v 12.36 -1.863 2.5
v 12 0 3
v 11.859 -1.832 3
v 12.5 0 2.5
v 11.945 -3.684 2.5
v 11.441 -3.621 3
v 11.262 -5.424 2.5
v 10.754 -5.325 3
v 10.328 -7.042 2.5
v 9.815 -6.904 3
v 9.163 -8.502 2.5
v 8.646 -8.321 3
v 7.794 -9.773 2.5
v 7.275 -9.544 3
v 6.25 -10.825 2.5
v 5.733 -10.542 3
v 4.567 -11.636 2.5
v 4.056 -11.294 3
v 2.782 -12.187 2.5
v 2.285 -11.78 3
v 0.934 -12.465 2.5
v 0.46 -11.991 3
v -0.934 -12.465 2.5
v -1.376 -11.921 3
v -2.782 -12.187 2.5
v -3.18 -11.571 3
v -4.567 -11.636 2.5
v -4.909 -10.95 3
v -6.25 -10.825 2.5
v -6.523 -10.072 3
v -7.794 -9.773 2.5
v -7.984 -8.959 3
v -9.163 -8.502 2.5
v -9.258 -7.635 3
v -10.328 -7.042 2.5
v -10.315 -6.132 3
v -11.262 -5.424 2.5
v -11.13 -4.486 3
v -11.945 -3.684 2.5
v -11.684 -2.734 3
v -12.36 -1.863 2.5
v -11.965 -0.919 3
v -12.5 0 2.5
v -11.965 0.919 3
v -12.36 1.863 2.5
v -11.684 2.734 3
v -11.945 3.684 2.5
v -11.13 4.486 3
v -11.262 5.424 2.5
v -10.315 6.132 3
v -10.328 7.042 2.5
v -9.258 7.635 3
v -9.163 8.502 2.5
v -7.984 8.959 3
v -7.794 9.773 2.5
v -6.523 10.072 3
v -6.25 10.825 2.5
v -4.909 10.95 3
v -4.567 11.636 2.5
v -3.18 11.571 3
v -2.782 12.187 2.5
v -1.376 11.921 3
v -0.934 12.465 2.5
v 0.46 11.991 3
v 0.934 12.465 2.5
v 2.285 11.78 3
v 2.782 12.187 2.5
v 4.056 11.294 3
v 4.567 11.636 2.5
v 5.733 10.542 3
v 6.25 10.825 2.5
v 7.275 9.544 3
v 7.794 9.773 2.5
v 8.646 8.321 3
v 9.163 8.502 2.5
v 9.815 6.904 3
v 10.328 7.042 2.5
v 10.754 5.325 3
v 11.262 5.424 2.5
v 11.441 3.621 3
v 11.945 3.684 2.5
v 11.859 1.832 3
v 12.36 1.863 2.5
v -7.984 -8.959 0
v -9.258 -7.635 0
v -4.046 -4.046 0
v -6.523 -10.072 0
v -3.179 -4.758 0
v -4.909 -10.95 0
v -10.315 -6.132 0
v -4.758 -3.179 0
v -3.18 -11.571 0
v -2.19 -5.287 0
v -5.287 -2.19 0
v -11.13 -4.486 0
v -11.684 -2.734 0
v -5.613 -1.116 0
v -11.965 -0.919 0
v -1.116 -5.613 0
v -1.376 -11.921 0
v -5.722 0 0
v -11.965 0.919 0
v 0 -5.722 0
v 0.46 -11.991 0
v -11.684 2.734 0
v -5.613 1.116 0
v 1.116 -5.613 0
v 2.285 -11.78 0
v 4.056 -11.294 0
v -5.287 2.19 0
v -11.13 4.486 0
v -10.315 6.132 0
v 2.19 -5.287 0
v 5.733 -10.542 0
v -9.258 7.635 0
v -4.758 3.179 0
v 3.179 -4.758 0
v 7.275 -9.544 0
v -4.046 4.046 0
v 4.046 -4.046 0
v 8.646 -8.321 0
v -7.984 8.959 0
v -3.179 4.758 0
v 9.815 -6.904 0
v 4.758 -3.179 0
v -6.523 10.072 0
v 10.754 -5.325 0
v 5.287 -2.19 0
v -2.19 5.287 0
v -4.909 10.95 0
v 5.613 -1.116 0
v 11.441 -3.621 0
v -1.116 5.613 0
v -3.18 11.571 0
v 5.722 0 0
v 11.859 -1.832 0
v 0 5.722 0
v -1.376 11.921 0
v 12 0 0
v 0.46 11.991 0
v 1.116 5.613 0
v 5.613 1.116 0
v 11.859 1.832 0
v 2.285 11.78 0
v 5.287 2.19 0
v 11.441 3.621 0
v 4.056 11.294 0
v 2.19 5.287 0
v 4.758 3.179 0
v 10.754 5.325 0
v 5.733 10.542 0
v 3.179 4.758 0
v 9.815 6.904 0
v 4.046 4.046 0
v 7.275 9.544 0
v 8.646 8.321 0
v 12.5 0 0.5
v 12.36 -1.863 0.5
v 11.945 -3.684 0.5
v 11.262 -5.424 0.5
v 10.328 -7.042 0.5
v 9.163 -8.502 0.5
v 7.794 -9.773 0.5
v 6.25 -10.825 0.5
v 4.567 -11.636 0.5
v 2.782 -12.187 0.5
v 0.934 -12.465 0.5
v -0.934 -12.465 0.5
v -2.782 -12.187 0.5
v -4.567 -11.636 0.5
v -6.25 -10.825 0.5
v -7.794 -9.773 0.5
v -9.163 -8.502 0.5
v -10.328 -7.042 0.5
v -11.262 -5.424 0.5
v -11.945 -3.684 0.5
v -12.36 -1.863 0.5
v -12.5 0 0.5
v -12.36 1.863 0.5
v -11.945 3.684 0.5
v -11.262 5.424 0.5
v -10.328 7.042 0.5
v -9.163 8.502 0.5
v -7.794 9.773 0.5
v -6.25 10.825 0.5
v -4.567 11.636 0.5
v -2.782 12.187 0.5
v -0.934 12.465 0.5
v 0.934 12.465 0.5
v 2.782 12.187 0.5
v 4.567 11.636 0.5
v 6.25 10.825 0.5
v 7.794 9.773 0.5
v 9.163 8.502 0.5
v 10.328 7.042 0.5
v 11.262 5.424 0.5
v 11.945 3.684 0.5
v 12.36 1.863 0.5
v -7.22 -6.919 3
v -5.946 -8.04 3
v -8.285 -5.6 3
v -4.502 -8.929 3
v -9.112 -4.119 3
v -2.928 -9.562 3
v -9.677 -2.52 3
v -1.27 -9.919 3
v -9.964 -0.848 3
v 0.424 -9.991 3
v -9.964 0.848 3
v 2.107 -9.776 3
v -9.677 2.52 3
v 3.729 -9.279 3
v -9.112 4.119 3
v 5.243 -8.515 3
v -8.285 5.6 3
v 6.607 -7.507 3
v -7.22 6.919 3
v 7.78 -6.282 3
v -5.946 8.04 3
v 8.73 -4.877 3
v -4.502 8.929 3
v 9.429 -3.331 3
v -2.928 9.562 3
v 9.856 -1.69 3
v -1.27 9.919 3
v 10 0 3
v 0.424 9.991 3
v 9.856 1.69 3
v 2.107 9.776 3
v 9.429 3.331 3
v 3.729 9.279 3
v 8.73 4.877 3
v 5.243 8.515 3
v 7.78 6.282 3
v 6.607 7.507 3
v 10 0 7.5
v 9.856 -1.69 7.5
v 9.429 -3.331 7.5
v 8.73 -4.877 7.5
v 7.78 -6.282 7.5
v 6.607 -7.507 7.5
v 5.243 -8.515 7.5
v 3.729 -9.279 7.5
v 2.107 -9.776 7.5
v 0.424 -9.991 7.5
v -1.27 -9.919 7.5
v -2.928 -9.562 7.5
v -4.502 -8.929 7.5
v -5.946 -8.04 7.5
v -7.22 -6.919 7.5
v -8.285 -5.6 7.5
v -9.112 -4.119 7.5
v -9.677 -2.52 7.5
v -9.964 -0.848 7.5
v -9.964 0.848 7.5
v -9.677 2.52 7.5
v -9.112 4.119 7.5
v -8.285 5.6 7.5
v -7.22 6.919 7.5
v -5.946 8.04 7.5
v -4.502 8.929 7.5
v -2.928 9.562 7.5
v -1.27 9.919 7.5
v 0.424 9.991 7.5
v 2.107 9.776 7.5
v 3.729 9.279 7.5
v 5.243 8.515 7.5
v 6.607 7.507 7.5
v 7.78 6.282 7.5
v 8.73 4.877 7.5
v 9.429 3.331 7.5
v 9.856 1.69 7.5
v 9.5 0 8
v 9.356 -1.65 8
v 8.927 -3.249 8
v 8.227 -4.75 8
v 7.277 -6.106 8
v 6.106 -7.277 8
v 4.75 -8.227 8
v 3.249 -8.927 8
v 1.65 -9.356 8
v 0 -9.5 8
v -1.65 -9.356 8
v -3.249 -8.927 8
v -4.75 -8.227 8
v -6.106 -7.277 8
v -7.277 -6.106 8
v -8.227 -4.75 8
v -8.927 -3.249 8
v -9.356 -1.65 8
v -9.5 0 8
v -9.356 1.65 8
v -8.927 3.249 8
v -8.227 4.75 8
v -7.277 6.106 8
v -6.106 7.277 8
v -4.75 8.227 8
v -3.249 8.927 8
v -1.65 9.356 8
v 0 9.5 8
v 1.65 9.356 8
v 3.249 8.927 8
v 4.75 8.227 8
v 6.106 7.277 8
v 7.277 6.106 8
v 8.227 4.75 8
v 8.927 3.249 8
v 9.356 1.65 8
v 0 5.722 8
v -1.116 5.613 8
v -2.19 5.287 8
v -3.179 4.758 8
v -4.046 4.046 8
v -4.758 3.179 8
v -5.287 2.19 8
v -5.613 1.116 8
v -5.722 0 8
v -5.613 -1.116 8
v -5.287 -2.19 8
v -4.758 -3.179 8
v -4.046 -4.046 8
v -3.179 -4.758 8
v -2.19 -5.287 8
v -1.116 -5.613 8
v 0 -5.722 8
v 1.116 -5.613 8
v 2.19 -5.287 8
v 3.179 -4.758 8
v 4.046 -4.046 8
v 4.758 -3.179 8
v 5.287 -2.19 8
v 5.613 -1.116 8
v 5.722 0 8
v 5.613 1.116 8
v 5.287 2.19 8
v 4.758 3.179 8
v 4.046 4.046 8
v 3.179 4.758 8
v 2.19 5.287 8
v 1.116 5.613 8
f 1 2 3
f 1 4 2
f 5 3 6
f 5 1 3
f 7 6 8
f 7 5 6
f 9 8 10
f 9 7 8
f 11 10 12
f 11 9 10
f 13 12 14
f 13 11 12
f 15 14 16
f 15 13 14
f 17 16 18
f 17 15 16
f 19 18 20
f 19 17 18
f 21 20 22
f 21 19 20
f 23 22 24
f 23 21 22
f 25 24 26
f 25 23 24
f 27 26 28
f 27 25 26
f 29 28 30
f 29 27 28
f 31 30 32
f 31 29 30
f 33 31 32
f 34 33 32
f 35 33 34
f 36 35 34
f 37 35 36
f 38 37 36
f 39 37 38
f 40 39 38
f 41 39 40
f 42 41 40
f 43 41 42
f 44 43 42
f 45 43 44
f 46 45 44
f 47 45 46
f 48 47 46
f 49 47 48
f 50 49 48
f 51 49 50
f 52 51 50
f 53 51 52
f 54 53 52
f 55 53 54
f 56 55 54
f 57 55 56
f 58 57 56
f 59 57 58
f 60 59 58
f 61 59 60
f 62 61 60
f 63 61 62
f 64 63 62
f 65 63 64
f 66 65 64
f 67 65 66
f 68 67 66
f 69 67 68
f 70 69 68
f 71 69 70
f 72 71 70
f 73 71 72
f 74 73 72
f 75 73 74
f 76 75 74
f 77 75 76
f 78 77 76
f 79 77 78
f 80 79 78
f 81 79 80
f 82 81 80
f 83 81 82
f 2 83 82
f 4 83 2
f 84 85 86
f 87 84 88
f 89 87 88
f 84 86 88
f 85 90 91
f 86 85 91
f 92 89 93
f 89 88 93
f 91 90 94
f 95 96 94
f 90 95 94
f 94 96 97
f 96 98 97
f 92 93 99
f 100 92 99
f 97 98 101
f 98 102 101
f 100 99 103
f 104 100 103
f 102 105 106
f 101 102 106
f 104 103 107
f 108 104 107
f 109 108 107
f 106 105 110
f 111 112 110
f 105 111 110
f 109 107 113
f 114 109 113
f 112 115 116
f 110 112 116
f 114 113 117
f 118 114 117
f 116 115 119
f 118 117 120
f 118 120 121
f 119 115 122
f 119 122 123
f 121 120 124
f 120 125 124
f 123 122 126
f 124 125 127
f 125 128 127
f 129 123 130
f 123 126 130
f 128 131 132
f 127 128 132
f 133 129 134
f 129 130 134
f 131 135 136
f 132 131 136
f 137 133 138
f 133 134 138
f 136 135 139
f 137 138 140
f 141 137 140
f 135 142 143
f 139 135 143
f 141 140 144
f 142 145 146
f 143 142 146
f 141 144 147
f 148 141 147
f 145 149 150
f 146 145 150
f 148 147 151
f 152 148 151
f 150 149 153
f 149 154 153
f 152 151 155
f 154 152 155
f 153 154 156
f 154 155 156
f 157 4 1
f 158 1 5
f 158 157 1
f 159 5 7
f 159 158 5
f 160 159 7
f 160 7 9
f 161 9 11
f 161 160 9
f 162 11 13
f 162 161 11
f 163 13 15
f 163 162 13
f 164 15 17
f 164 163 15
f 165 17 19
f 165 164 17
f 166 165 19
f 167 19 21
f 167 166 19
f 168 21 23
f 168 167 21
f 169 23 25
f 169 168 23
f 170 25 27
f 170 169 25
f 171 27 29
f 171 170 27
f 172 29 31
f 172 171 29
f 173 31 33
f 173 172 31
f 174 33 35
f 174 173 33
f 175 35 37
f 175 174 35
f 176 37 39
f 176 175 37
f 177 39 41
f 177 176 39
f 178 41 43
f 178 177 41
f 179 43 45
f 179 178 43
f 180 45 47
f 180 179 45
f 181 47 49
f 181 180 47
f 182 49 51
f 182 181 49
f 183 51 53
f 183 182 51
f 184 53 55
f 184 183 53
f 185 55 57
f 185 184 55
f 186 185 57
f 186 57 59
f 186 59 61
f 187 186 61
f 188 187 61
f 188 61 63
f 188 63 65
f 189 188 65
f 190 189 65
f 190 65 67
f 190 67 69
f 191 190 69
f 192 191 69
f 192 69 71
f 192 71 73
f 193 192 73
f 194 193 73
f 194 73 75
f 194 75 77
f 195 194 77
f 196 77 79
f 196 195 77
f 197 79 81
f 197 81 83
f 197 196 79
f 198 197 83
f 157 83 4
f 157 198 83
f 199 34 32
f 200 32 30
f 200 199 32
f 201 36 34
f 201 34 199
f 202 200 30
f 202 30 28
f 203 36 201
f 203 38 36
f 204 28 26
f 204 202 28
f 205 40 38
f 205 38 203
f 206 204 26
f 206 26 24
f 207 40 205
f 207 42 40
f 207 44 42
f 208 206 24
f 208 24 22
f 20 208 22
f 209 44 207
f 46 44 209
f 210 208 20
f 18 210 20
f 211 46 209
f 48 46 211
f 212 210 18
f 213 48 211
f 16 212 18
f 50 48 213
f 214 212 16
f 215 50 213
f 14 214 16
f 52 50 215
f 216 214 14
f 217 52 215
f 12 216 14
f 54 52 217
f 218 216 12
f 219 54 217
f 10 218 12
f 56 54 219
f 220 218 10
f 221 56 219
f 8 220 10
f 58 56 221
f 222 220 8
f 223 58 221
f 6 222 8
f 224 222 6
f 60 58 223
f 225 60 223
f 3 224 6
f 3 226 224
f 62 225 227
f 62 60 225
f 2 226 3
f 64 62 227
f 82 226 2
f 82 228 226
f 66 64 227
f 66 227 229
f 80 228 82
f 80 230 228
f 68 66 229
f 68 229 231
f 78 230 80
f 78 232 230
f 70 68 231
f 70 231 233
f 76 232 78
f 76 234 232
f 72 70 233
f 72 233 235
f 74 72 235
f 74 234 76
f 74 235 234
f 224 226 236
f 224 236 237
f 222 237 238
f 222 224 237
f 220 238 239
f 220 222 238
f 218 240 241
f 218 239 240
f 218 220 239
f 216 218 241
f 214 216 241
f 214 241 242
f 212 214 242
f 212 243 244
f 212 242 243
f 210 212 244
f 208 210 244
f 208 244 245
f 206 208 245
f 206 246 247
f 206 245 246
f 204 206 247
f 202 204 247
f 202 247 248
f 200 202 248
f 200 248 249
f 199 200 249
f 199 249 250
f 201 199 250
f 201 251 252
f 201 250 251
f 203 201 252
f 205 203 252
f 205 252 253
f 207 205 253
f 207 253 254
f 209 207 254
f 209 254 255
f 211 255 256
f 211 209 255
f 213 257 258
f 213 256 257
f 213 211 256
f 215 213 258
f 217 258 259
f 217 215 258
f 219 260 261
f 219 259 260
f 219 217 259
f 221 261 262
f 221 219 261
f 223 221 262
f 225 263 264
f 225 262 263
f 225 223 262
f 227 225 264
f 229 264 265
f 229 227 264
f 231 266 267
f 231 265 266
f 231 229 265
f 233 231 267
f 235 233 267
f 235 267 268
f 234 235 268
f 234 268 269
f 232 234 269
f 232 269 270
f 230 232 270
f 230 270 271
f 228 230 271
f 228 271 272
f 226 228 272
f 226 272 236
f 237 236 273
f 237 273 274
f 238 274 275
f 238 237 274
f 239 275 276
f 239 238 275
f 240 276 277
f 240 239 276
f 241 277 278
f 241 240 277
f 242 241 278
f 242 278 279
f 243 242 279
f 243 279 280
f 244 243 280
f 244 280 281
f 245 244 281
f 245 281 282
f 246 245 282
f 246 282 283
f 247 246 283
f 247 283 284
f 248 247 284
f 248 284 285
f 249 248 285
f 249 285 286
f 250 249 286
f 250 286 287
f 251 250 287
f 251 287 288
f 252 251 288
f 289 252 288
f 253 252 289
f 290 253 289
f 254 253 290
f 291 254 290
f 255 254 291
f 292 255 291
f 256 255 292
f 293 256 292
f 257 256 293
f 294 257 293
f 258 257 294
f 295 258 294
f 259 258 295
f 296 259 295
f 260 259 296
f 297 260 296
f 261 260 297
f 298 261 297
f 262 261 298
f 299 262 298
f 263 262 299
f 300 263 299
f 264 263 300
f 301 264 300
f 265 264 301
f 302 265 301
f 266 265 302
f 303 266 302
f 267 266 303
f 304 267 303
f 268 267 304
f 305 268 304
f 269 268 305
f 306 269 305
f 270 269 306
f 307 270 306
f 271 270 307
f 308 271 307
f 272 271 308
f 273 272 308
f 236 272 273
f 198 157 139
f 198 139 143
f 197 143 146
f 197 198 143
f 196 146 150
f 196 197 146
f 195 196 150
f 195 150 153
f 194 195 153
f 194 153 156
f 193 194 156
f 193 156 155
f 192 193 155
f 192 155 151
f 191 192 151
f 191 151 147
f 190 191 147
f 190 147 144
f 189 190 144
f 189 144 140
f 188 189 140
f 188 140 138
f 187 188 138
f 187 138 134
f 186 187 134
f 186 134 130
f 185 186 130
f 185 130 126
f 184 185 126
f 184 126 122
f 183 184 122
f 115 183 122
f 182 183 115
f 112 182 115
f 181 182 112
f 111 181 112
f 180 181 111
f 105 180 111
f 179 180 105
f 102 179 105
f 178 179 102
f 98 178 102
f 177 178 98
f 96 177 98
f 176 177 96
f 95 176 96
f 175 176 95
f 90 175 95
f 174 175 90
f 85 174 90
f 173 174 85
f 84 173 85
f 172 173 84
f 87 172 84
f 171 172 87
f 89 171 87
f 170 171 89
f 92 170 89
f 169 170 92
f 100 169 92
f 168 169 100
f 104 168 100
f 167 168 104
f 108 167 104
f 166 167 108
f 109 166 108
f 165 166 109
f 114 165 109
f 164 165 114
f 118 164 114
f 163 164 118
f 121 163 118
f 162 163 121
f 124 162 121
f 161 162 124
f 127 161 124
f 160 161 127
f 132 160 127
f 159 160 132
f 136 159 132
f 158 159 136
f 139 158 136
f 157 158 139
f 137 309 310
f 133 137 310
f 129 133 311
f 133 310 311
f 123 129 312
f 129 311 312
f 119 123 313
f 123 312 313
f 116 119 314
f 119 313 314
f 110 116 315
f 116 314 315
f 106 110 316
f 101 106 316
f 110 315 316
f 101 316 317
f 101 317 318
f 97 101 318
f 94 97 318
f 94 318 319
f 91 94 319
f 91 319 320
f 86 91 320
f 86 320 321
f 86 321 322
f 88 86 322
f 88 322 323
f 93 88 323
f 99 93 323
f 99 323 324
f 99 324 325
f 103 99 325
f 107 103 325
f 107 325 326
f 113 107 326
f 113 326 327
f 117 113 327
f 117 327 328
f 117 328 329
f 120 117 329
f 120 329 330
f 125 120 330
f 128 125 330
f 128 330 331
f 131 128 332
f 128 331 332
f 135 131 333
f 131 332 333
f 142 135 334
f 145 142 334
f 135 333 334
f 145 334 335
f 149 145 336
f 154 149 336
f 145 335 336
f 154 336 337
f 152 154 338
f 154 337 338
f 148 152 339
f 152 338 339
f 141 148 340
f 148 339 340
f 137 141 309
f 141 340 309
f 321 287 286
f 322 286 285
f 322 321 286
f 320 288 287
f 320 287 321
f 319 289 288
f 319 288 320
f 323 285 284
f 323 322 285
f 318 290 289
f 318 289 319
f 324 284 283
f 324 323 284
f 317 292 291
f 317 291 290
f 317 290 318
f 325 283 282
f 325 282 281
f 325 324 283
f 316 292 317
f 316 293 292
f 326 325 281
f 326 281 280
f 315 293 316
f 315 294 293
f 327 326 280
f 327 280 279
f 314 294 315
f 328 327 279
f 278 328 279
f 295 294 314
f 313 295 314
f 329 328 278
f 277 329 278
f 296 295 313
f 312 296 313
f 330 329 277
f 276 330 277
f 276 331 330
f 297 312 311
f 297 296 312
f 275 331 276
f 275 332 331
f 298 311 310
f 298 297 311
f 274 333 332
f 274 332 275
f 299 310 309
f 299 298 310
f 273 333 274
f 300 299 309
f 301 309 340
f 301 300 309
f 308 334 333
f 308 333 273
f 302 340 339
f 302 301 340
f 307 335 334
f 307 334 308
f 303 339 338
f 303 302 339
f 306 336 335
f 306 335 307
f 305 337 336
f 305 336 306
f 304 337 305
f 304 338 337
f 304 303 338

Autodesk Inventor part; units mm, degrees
ref_plane "YZ Plane" through (0, 0, 0) normal (1, 0, 0) x (0, 1, 0)
ref_plane "XZ Plane" through (0, 0, 0) normal (0, 1, 0) x (-1, 0, 0)
ref_plane "XY Plane" through (0, 0, 0) normal (0, 0, 1) x (1, 0, 0)
sketch "Skizze1" plane through (0, 0, 0) normal (0, 0, 1) x (1, 0, 0)
  line L0 (-17.5, 0) -> (17.5, 0) projected
  line L1 (0, -17.5) -> (0, 17.5) projected
  circle A0 centre (0, 0) radius 12.5
  dimension "d0" = 25
extrude "Extrusion1" add sketch "Skizze1" along normal blind 3
sketch "Skizze2" plane through (0, 0, 3) normal (0, 0, 1) x (1, 0, 0)
  circle A0 centre (0, 0) radius 10
  dimension "d3" = 20
extrude "Extrusion2" add sketch "Skizze2" along normal blind 5
thread "Gewinde1" size "M20x2.5" class "6g" standard "ISO Metric profile" length 15
chamfer "Fase1" distance 0.5 angle 45 3 edges at (-10, 0, 8) (-12.5, 0, 3) (-12.5, 0, 0)
sketch "Skizze3" plane through (0, 0, 0) normal (0, 0, -1) x (-1, 0, 0)
  point P0 (0, 0)
  point P1 (0, 0)
hole "Bohrung1" at (0, 0, 0) direction (0, 0, 1) diameter 11.445 depth 32.814 thread size "G13.157x1.337" designation "G 1/4" standard "ISO Pipe Threads"
properties part number "VerteilerVerschluss"
